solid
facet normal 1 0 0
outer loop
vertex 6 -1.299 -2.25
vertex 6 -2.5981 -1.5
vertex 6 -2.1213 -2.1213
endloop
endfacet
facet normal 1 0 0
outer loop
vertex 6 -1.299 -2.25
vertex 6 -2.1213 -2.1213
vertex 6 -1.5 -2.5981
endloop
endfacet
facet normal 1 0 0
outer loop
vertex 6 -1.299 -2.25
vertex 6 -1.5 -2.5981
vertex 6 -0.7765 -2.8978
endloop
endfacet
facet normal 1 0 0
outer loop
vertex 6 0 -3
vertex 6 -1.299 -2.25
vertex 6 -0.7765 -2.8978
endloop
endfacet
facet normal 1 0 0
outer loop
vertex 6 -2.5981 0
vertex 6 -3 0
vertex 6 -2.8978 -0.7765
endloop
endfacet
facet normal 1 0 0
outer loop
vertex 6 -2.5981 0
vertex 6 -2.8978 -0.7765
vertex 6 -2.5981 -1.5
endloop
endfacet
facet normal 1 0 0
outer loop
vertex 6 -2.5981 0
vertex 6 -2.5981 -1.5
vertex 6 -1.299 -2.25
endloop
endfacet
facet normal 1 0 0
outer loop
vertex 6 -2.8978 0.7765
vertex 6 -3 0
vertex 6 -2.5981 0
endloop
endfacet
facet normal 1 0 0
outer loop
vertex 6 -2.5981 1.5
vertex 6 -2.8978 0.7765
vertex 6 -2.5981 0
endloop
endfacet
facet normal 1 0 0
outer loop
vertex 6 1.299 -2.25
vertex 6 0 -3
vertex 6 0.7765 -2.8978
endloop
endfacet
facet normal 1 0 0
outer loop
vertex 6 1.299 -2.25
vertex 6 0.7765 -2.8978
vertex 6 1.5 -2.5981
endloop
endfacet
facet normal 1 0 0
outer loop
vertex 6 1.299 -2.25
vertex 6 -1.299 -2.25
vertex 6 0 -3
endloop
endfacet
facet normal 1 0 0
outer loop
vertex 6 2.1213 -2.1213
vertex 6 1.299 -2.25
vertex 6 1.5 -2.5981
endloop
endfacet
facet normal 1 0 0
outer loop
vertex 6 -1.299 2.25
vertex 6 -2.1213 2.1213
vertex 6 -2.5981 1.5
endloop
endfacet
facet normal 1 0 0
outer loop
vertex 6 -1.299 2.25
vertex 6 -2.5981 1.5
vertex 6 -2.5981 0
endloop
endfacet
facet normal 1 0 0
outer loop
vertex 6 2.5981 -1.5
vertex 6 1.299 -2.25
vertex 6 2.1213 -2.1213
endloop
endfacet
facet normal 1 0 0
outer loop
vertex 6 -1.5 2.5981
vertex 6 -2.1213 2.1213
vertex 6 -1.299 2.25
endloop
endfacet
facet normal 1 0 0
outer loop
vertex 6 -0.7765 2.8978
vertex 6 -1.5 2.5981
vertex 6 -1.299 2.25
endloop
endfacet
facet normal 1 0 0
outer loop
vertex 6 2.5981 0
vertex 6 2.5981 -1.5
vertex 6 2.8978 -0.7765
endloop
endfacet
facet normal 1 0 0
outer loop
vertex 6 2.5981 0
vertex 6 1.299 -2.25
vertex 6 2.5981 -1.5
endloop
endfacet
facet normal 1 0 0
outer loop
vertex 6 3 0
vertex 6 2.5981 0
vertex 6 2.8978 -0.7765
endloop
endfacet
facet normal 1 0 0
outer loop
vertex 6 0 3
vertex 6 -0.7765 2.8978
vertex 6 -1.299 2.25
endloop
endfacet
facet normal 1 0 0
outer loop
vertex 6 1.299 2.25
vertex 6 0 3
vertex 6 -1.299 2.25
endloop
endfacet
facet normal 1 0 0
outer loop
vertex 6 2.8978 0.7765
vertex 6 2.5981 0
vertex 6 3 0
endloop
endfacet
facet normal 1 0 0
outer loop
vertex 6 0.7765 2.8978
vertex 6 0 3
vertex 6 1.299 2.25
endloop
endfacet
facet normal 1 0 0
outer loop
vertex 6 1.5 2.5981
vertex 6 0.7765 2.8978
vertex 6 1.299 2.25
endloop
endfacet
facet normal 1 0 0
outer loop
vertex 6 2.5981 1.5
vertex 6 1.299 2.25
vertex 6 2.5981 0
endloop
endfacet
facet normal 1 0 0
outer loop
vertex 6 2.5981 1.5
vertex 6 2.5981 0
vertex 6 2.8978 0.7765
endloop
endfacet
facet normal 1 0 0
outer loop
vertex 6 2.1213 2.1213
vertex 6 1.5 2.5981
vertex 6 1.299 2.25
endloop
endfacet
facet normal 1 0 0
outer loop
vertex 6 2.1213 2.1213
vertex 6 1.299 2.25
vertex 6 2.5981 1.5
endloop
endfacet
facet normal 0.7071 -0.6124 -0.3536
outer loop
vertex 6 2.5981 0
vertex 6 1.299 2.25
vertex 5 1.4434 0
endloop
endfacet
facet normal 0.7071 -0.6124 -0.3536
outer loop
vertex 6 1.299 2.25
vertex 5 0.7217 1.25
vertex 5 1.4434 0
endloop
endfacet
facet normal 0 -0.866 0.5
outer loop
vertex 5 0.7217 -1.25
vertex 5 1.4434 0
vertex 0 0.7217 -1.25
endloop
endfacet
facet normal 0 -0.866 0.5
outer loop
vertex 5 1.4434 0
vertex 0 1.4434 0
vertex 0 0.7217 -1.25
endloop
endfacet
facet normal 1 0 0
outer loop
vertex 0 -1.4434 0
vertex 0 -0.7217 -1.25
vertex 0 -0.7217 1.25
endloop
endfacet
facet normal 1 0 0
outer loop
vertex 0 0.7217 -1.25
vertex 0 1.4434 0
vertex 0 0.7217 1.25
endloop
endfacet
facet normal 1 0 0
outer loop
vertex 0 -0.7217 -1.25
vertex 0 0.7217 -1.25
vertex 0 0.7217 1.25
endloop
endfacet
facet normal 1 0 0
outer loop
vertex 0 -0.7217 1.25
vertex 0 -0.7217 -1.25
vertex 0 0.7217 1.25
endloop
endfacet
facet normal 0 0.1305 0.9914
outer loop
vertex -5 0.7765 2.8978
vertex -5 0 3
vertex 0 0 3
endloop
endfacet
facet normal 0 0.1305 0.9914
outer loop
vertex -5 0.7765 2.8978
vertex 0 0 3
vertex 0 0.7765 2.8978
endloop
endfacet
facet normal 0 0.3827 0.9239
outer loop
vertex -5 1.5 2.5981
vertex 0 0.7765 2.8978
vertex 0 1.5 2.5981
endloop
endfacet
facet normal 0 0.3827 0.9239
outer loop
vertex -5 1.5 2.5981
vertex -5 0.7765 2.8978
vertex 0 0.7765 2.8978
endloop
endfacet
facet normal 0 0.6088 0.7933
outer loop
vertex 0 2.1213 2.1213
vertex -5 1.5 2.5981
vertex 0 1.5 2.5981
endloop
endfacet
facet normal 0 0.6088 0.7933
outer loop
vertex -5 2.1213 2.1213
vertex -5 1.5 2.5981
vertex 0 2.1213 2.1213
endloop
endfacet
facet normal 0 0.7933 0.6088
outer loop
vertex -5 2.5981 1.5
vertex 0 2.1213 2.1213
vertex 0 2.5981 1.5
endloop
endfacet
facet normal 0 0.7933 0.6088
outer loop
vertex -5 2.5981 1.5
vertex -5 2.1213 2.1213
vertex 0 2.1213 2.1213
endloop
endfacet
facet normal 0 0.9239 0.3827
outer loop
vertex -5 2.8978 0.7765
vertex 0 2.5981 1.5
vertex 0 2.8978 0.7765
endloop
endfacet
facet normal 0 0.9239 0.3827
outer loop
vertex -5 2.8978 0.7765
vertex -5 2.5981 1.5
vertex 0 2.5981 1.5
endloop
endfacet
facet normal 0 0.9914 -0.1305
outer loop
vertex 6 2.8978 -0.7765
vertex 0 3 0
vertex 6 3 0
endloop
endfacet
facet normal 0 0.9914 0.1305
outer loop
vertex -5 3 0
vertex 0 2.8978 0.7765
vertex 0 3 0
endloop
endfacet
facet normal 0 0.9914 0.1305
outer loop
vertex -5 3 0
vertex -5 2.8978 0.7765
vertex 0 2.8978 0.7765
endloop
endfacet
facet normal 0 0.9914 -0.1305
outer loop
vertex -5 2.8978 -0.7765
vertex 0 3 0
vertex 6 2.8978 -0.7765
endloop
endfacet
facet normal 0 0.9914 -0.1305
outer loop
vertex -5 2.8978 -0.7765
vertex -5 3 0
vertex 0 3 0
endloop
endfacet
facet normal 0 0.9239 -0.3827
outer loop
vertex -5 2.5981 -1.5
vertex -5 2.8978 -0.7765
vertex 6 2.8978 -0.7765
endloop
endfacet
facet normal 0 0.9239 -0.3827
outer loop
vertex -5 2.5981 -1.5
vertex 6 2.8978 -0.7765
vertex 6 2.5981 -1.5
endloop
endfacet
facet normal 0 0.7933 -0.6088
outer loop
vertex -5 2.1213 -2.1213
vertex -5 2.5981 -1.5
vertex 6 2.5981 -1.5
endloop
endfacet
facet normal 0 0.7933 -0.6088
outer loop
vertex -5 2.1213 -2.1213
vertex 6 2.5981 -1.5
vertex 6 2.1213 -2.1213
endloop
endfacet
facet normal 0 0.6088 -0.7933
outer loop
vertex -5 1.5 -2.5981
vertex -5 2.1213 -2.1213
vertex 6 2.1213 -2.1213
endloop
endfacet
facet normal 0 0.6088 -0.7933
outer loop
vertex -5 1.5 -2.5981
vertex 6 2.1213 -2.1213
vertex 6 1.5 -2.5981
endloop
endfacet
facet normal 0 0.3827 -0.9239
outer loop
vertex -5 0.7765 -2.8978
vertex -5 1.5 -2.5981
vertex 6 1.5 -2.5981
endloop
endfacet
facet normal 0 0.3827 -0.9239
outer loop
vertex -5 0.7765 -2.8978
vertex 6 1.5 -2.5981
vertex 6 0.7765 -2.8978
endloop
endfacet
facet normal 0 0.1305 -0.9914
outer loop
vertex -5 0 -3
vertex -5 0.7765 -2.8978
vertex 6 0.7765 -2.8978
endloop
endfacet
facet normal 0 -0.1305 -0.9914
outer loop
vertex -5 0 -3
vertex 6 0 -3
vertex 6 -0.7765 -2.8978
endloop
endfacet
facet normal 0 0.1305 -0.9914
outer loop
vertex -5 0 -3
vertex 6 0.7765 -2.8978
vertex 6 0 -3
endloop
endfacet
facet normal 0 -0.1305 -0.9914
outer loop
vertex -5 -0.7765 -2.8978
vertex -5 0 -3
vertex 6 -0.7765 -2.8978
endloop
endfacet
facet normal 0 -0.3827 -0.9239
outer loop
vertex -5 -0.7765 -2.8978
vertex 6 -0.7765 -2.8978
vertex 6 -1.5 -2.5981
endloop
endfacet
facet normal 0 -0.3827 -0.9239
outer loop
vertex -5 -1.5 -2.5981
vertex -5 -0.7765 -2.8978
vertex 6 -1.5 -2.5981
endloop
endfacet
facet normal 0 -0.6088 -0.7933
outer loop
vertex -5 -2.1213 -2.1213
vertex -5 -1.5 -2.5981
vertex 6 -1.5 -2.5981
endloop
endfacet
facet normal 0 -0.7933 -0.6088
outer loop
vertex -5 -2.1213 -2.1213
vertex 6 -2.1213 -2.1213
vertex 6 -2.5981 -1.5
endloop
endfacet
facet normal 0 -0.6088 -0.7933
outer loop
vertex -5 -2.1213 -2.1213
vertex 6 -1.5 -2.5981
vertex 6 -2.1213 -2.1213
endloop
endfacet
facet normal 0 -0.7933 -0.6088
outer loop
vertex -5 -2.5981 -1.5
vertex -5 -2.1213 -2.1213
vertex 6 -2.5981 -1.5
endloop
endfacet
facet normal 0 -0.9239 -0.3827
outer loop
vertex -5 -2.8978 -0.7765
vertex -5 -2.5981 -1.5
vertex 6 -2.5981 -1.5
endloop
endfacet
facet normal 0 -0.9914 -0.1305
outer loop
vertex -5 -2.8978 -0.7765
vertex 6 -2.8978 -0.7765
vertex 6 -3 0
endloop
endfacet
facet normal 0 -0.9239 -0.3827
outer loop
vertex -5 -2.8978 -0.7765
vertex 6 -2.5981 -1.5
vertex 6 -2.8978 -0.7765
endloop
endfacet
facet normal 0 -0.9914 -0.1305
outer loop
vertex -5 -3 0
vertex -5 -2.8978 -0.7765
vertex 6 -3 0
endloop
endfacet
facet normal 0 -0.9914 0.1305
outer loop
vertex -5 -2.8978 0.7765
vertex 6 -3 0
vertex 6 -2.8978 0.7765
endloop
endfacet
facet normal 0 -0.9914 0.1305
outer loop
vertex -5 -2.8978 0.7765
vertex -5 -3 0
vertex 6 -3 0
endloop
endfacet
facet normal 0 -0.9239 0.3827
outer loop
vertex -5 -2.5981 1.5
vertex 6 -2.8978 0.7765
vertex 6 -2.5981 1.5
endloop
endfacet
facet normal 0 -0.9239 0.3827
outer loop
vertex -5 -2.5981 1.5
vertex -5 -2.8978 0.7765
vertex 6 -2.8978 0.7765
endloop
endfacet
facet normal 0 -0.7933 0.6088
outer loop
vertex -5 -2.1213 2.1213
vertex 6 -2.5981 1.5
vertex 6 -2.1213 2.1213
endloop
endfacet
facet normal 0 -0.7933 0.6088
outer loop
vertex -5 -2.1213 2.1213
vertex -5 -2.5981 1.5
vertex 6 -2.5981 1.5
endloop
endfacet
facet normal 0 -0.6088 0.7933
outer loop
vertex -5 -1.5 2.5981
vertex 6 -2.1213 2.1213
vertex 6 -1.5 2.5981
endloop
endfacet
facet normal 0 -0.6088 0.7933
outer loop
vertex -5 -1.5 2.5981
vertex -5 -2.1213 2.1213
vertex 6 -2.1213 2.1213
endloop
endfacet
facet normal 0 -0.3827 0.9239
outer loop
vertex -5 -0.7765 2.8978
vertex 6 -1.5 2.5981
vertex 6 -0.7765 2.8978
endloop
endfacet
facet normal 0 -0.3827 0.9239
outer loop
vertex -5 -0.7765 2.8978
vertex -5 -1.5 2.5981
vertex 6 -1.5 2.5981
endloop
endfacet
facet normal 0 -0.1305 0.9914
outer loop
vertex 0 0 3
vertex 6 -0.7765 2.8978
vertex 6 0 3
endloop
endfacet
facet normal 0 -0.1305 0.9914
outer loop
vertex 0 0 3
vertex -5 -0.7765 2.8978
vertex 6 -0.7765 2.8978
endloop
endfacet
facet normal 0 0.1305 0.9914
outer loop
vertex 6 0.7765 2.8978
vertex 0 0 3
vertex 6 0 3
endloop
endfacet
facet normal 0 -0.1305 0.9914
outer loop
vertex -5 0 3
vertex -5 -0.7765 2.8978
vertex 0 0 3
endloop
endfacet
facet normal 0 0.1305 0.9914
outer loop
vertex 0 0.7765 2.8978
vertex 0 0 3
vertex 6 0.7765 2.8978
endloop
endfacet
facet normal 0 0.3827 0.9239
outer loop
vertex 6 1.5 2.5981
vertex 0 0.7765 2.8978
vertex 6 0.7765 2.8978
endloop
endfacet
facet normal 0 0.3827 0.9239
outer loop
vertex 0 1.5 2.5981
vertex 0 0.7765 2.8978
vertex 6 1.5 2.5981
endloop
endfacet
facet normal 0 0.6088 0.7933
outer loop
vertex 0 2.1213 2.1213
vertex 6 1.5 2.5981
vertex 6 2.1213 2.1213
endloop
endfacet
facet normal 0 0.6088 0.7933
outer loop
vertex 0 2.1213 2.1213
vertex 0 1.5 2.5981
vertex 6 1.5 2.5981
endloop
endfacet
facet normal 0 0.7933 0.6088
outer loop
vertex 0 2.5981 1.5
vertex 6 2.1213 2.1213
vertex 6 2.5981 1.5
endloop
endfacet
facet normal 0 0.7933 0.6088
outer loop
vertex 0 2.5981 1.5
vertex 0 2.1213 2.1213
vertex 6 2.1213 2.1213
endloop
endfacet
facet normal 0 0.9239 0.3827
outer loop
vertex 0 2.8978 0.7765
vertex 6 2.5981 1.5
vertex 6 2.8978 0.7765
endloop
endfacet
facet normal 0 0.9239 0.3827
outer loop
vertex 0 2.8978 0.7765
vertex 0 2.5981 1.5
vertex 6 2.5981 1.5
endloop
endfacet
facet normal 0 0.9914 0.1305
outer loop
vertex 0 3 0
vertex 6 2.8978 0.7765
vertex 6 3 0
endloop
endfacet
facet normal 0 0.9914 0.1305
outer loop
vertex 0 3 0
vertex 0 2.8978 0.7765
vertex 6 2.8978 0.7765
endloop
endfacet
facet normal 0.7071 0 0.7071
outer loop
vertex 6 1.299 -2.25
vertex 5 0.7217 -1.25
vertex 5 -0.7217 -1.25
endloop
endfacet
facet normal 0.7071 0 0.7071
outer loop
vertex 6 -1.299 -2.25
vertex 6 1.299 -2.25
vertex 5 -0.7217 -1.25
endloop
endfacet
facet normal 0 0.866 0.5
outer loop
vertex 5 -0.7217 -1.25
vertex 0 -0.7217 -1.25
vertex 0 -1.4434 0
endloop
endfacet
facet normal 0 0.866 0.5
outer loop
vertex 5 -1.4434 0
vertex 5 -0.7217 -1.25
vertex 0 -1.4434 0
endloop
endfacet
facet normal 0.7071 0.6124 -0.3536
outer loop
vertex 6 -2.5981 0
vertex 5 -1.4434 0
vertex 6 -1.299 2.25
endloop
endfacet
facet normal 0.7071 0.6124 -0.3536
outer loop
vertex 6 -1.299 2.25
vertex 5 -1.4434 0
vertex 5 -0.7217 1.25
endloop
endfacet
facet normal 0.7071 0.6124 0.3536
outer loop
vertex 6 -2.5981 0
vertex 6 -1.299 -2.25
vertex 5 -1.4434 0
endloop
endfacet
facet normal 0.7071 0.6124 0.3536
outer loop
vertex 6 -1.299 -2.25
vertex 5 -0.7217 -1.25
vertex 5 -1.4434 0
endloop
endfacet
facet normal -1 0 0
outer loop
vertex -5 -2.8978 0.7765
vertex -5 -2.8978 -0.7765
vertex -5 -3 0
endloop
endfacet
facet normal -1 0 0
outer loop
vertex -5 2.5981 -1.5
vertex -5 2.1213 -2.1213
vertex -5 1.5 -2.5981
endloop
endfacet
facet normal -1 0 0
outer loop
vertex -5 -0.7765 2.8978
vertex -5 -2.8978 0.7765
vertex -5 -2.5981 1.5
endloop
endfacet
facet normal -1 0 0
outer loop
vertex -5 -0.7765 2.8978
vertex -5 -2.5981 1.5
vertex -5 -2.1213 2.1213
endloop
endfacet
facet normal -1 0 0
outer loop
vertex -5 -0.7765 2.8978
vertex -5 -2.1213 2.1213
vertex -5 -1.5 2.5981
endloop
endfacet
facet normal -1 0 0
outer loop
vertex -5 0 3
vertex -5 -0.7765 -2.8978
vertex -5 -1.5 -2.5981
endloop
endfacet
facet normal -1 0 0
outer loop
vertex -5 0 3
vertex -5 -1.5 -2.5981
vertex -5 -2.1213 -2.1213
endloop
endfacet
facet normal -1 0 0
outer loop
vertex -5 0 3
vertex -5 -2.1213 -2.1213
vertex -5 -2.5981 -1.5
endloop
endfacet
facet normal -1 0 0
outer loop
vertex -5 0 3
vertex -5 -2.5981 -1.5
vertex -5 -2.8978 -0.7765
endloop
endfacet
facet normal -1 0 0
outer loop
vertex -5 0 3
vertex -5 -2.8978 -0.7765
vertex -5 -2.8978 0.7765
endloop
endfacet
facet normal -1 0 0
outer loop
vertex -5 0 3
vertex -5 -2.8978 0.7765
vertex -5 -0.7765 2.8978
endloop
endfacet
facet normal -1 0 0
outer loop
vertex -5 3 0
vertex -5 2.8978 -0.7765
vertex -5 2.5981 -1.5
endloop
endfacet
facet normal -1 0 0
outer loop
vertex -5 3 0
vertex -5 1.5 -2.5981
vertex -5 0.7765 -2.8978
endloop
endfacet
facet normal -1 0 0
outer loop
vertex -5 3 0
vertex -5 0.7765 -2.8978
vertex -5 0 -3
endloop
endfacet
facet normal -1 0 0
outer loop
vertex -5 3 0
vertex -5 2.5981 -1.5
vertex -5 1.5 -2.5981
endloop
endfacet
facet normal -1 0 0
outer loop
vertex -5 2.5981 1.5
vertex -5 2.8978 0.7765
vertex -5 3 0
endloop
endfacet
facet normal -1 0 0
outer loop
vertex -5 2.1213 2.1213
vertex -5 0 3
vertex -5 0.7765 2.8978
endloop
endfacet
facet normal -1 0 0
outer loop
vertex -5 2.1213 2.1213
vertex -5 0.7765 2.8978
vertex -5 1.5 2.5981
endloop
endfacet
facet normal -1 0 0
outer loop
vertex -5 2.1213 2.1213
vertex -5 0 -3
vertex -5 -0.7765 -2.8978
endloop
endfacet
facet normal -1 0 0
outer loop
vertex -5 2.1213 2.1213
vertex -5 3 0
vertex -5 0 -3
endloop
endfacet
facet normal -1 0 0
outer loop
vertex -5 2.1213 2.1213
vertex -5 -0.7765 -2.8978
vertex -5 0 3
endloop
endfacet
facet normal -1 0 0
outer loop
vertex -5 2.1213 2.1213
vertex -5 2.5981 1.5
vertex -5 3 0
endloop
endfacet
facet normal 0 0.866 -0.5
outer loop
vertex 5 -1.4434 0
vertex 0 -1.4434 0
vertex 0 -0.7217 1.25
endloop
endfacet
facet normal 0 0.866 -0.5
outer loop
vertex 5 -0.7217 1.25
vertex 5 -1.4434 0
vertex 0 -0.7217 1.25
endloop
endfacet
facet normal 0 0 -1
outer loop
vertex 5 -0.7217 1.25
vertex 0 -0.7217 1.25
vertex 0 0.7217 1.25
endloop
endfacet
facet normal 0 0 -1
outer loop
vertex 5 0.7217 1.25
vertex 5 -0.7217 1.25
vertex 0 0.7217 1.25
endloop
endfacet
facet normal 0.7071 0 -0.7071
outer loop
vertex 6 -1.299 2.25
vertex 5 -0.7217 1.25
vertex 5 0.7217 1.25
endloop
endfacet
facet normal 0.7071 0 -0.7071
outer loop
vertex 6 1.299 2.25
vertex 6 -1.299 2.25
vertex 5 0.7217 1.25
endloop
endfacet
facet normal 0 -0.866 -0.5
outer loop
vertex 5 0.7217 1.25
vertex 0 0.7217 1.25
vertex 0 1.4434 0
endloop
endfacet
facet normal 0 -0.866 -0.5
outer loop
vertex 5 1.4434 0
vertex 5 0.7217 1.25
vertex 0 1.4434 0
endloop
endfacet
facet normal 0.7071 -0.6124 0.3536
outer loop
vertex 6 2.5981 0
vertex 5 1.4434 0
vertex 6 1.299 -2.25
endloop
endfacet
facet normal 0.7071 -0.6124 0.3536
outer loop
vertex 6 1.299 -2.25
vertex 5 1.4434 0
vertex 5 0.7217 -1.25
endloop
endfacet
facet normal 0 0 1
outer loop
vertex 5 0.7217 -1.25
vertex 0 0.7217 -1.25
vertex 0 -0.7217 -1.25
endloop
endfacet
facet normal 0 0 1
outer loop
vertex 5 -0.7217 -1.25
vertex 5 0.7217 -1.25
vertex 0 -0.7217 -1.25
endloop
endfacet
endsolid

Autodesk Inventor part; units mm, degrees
ref_plane "YZ Plane" through (0, 0, 0) normal (1, 0, 0) x (0, 1, 0)
ref_plane "XZ Plane" through (0, 0, 0) normal (0, 1, 0) x (-1, 0, 0)
ref_plane "XY Plane" through (0, 0, 0) normal (0, 0, 1) x (1, 0, 0)
sketch "Skizze1" plane through (0, 0, 0) normal (1, 0, 0) x (0, 1, 0)
  circle A0 centre (0, 0) radius 3
  line L0 (1.4434, 0) -> (0.7217, -1.25)
  line L1 (0.7217, -1.25) -> (-0.7217, -1.25)
  line L2 (-0.7217, -1.25) -> (-1.4434, 0)
  line L3 (-1.4434, 0) -> (-0.7217, 1.25)
  line L4 (-0.7217, 1.25) -> (0.7217, 1.25)
  line L5 (0.7217, 1.25) -> (1.4434, 0)
  point P0 (0, -1.25)
  point P1 (0, 1.25)
  dimension "d0" = 6
  dimension "d1" = 2.5
extrude "Extrusion1" add sketch "Skizze1" along normal blind 6
sketch "Skizze2" plane through (0, 0, 0) normal (-1, 0, 0) x (0, 0, 1)
  circle A0 centre (0, 0) radius 3 projected
  line L0 (0, 1.4434) -> (-1.25, 0.7217) projected
  line L1 (1.25, 0.7217) -> (0, 1.4434) projected
  line L2 (1.25, -0.7217) -> (1.25, 0.7217) projected
  line L3 (0, -1.4434) -> (1.25, -0.7217) projected
  line L4 (-1.25, -0.7217) -> (0, -1.4434) projected
  line L5 (-1.25, 0.7217) -> (-1.25, -0.7217) projected
  circle A1 centre (0, 0) radius 3
extrude "Extrusion2" add sketch "Skizze2" along normal blind 5 contours A0 | L1 L2 L3 L4 L5 L0
chamfer "Fase1" distance 1 angle 45 6 edges at (6, 1.0825, 0.625) (6, 1.0825, -0.625) (6, 0, -1.25) (6, -1.0825, -0.625) (6, -1.0825, 0.625) (6, 0, 1.25)
properties part number "40_XYZstage_micrometer_motorized_nema8_zadapter_m2.5nut"
